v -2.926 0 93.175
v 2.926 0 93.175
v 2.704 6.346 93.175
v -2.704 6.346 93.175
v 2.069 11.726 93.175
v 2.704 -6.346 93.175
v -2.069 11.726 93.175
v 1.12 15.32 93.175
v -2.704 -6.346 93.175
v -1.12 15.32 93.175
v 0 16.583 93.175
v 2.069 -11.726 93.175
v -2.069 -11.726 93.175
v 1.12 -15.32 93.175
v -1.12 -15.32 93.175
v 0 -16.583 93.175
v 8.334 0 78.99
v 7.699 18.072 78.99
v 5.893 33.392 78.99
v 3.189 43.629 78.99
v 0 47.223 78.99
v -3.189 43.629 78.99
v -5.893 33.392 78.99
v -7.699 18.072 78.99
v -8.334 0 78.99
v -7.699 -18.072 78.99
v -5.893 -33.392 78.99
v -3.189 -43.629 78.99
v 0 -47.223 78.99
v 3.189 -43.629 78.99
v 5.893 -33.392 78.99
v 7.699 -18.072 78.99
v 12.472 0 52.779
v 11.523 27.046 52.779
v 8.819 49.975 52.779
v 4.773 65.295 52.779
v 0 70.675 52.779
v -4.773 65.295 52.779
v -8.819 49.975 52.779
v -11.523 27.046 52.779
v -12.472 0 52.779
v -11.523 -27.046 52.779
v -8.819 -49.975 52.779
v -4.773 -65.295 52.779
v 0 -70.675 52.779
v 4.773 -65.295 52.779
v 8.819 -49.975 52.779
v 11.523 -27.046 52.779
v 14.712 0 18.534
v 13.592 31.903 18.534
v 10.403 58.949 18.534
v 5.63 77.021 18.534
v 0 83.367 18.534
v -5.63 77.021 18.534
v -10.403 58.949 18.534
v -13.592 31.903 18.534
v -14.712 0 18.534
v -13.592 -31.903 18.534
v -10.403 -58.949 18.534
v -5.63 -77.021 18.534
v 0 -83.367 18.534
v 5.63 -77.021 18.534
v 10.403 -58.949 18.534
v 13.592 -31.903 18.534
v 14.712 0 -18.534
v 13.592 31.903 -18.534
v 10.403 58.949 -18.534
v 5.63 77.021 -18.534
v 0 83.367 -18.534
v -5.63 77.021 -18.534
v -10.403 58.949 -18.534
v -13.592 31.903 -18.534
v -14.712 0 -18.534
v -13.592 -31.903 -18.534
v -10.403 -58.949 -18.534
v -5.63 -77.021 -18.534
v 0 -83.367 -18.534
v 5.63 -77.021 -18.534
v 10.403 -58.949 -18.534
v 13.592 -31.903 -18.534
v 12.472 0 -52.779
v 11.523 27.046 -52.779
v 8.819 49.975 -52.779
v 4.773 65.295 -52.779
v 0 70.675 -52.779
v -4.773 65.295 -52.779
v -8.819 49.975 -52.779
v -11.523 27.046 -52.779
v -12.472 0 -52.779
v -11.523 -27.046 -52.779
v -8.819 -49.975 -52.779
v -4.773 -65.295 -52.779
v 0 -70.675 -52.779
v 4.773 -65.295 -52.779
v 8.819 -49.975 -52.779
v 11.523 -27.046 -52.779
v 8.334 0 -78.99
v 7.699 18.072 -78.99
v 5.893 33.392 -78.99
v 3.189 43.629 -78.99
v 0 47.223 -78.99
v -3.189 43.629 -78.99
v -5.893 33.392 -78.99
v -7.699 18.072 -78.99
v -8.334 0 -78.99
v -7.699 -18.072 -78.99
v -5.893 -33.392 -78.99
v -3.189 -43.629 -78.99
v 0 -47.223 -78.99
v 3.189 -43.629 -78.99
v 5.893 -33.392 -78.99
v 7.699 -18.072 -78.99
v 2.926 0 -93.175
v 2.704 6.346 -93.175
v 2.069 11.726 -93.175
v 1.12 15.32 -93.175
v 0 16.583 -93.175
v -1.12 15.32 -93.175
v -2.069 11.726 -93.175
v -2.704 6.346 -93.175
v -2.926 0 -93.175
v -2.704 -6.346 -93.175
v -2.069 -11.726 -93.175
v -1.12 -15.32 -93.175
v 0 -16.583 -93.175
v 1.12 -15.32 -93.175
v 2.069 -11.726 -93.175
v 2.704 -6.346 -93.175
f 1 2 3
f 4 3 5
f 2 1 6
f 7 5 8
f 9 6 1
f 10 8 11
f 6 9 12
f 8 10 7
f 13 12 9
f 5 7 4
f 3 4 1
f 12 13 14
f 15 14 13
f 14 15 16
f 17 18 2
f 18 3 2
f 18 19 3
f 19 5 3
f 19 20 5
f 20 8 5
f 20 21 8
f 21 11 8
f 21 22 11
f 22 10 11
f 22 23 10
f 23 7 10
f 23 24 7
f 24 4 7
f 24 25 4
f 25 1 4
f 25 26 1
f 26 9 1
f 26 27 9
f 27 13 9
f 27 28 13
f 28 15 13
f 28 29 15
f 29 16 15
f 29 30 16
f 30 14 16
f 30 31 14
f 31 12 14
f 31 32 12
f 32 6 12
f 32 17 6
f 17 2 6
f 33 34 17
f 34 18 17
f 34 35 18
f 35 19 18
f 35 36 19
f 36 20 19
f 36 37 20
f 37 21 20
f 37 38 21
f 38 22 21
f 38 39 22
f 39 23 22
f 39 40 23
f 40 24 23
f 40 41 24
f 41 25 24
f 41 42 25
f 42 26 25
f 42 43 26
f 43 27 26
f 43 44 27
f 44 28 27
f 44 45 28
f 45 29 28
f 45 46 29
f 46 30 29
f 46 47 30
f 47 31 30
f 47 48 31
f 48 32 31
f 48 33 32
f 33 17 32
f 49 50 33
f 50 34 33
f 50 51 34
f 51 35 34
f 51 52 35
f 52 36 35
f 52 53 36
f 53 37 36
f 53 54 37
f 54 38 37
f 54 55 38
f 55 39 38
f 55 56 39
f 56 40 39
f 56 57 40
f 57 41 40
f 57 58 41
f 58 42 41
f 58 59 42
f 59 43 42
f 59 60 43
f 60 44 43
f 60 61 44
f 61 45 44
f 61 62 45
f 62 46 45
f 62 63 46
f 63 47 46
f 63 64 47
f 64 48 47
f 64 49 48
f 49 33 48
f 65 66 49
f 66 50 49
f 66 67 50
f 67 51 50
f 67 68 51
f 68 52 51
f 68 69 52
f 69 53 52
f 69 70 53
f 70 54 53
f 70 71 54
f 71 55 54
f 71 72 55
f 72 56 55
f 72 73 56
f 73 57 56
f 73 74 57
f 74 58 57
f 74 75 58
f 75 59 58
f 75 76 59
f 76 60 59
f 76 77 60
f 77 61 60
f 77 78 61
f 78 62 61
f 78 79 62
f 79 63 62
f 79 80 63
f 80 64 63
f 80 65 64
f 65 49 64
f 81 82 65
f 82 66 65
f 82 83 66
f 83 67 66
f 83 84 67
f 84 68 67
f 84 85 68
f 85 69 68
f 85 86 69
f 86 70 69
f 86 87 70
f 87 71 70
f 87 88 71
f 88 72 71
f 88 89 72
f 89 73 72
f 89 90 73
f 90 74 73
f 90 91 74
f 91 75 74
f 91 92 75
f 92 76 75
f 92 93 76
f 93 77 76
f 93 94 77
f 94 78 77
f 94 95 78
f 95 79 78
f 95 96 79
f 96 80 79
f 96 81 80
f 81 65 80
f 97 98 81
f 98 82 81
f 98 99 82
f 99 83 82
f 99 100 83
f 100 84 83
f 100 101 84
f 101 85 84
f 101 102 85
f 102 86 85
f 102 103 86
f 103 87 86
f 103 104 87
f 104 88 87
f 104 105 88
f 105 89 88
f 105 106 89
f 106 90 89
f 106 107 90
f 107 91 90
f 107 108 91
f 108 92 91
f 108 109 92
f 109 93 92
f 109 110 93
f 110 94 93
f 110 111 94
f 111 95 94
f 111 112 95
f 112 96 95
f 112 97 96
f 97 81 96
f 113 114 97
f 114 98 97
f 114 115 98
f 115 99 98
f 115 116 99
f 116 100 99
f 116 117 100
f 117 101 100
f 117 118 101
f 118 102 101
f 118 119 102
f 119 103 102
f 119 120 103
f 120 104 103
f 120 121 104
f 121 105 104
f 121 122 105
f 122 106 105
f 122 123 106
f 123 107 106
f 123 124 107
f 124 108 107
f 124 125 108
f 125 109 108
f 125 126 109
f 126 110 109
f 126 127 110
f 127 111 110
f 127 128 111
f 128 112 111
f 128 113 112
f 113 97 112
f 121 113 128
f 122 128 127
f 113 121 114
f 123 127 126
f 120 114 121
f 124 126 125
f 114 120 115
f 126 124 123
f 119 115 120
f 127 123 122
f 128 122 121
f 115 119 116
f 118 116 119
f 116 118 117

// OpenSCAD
// Generated by SolidPython 1.0.1 on 2020-07-29 00:46:46


scale(v = [3, 17, 19]) {
	sphere(r = 5);
}
/***********************************************
*********      SolidPython code:      **********
************************************************
 
# import packages: SolidPython
from solid import *
from solid.utils import *
from itertools import chain, combinations, permutations


class Resize:

    def __init__(self, scad_file):
        self.scad_file = scad_file
        #self.scad_file = import_scad(scad_file)
        # cone/cylinder param:
        self.r1 = 0
        self.r2 = 0
        self.h = 0
        # rectangular prism param:
        self.w = 0
        self.l = 0
        # ellipse param:
        self.r = 0

    # import OpenScad code (file name corresponds to shape)


    # classify shape + parameters
    def assign(self, param1, param2, param3):
        if self.scad_file == 'cone.scad':
            self.r1 = param1
            self.r2 = param2
            self.h = param3
        elif self.scad_file == 'cylinder.scad':
            self.r1 = param1
            self.r2 = param2
            self.h = param3
        elif self.scad_file == 'rectangularPrism.scad':
            self.h = param1
            self.l = param2
            self.w = param3
        else:
            self.r = param1
            self.h = param2

    # resize parameters
    def iterate(self):
        x = range(3, 20, 2)
        i = 1
        if self.scad_file == 'cone.scad':
            tempList = list(permutations(x, 2))
            for temp in tempList:
                param1 = temp[0]
                param2 = temp[1]
                filepath = 'produced_scad_files/' + 'cone' + str(param1) + '_' + str(param2) + '_' + '.scad'
                scad_render_to_file(cylinder(h=param1, r1=param2, r2=0), filepath)

        elif self.scad_file == 'cylinder.scad':
            tempList = list(permutations(x, 3))
            for temp in tempList:
                param1 = temp[0]
                param2 = temp[1]
                filepath = 'produced_scad_files/' + 'cylinder' + str(param1) + '_' + str(param2) + '_' + '.scad'
                scad_render_to_file(cylinder(h=param1, r1=param2, r2=param2), filepath)

        elif self.scad_file == 'rectangularPrism.scad':
            tempList = list(permutations(x, 3))
            for temp in tempList:
                param1 = temp[0]
                param2 = temp[1]
                param3 = temp[2]
                filepath = 'produced_scad_files/' + 'rectangularPrism' + str(param1) + '_' + str(param2) + '_' + str(
                    param3) + '.scad'
                scad_render_to_file(cube(size=(param1, param2, param3)), filepath)

        elif self.scad_file == 'ellipse.scad':
            tempList = list(permutations(x, 4))
            for temp in tempList:
                param1 = temp[0]
                param2 = temp[1]
                param3 = temp[2]
                param4 = temp[3]
                filepath = 'produced_scad_files/' + 'ellipse' + str(param1) + '_' + str(param2) + '_' + str(param3) + '_' + str(param4) + '.scad'
                scad_render_to_file(scale([param1, param2, param3])(sphere(r=param4)), filepath)

    def render_to_scadfile(self):
        scad_render_to_file(scad, 'example.scad') 
 
************************************************/
